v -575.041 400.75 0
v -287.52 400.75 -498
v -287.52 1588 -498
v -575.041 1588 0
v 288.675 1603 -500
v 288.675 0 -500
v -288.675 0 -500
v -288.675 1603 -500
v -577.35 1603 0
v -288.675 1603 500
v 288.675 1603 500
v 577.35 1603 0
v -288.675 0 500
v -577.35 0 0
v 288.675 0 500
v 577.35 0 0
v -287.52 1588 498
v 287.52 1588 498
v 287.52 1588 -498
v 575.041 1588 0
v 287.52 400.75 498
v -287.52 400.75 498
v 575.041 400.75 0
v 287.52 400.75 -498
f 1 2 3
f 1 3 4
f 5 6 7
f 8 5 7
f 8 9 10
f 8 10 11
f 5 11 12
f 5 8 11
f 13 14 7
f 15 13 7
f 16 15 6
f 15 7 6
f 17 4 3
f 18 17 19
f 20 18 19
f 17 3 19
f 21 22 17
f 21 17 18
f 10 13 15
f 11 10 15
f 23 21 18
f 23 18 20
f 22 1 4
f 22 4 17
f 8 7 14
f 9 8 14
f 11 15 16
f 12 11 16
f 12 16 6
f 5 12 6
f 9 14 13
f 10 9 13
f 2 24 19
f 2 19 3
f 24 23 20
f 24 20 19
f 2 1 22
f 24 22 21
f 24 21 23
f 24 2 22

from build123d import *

# Parameters (mm, degrees)
BOSS_EXTRUDE1_DEPTH = 1603
CUT_EXTRUDE1_DEPTH  = 1187.25


with BuildPart() as part:
    # Sketch2 → Boss-Extrude1 (new body)
    with BuildSketch(Plane(origin=(0, 0, 0), x_dir=(1, 0, 0), z_dir=(0, 1, 0))):
        Polygon((577.35026919, 0), (288.675134595, 500), (-288.675134595, 500), (-577.35026919, 0), (-288.675134595, -500), (288.675134595, -500), align=None)
    extrude(amount=BOSS_EXTRUDE1_DEPTH)

    # Sketch3 → Cut-Extrude1 (cut)
    with BuildSketch(Plane(origin=(0, 400.75, 0), x_dir=(1, 0, 0), z_dir=(0, 1, 0))):
        Polygon((575.040868113, 0), (287.520434056, 498), (-287.520434056, 498), (-575.040868113, 0), (-287.520434056, -498), (287.520434056, -498), align=None)
    extrude(amount=CUT_EXTRUDE1_DEPTH, mode=Mode.SUBTRACT)


solid = part.part
